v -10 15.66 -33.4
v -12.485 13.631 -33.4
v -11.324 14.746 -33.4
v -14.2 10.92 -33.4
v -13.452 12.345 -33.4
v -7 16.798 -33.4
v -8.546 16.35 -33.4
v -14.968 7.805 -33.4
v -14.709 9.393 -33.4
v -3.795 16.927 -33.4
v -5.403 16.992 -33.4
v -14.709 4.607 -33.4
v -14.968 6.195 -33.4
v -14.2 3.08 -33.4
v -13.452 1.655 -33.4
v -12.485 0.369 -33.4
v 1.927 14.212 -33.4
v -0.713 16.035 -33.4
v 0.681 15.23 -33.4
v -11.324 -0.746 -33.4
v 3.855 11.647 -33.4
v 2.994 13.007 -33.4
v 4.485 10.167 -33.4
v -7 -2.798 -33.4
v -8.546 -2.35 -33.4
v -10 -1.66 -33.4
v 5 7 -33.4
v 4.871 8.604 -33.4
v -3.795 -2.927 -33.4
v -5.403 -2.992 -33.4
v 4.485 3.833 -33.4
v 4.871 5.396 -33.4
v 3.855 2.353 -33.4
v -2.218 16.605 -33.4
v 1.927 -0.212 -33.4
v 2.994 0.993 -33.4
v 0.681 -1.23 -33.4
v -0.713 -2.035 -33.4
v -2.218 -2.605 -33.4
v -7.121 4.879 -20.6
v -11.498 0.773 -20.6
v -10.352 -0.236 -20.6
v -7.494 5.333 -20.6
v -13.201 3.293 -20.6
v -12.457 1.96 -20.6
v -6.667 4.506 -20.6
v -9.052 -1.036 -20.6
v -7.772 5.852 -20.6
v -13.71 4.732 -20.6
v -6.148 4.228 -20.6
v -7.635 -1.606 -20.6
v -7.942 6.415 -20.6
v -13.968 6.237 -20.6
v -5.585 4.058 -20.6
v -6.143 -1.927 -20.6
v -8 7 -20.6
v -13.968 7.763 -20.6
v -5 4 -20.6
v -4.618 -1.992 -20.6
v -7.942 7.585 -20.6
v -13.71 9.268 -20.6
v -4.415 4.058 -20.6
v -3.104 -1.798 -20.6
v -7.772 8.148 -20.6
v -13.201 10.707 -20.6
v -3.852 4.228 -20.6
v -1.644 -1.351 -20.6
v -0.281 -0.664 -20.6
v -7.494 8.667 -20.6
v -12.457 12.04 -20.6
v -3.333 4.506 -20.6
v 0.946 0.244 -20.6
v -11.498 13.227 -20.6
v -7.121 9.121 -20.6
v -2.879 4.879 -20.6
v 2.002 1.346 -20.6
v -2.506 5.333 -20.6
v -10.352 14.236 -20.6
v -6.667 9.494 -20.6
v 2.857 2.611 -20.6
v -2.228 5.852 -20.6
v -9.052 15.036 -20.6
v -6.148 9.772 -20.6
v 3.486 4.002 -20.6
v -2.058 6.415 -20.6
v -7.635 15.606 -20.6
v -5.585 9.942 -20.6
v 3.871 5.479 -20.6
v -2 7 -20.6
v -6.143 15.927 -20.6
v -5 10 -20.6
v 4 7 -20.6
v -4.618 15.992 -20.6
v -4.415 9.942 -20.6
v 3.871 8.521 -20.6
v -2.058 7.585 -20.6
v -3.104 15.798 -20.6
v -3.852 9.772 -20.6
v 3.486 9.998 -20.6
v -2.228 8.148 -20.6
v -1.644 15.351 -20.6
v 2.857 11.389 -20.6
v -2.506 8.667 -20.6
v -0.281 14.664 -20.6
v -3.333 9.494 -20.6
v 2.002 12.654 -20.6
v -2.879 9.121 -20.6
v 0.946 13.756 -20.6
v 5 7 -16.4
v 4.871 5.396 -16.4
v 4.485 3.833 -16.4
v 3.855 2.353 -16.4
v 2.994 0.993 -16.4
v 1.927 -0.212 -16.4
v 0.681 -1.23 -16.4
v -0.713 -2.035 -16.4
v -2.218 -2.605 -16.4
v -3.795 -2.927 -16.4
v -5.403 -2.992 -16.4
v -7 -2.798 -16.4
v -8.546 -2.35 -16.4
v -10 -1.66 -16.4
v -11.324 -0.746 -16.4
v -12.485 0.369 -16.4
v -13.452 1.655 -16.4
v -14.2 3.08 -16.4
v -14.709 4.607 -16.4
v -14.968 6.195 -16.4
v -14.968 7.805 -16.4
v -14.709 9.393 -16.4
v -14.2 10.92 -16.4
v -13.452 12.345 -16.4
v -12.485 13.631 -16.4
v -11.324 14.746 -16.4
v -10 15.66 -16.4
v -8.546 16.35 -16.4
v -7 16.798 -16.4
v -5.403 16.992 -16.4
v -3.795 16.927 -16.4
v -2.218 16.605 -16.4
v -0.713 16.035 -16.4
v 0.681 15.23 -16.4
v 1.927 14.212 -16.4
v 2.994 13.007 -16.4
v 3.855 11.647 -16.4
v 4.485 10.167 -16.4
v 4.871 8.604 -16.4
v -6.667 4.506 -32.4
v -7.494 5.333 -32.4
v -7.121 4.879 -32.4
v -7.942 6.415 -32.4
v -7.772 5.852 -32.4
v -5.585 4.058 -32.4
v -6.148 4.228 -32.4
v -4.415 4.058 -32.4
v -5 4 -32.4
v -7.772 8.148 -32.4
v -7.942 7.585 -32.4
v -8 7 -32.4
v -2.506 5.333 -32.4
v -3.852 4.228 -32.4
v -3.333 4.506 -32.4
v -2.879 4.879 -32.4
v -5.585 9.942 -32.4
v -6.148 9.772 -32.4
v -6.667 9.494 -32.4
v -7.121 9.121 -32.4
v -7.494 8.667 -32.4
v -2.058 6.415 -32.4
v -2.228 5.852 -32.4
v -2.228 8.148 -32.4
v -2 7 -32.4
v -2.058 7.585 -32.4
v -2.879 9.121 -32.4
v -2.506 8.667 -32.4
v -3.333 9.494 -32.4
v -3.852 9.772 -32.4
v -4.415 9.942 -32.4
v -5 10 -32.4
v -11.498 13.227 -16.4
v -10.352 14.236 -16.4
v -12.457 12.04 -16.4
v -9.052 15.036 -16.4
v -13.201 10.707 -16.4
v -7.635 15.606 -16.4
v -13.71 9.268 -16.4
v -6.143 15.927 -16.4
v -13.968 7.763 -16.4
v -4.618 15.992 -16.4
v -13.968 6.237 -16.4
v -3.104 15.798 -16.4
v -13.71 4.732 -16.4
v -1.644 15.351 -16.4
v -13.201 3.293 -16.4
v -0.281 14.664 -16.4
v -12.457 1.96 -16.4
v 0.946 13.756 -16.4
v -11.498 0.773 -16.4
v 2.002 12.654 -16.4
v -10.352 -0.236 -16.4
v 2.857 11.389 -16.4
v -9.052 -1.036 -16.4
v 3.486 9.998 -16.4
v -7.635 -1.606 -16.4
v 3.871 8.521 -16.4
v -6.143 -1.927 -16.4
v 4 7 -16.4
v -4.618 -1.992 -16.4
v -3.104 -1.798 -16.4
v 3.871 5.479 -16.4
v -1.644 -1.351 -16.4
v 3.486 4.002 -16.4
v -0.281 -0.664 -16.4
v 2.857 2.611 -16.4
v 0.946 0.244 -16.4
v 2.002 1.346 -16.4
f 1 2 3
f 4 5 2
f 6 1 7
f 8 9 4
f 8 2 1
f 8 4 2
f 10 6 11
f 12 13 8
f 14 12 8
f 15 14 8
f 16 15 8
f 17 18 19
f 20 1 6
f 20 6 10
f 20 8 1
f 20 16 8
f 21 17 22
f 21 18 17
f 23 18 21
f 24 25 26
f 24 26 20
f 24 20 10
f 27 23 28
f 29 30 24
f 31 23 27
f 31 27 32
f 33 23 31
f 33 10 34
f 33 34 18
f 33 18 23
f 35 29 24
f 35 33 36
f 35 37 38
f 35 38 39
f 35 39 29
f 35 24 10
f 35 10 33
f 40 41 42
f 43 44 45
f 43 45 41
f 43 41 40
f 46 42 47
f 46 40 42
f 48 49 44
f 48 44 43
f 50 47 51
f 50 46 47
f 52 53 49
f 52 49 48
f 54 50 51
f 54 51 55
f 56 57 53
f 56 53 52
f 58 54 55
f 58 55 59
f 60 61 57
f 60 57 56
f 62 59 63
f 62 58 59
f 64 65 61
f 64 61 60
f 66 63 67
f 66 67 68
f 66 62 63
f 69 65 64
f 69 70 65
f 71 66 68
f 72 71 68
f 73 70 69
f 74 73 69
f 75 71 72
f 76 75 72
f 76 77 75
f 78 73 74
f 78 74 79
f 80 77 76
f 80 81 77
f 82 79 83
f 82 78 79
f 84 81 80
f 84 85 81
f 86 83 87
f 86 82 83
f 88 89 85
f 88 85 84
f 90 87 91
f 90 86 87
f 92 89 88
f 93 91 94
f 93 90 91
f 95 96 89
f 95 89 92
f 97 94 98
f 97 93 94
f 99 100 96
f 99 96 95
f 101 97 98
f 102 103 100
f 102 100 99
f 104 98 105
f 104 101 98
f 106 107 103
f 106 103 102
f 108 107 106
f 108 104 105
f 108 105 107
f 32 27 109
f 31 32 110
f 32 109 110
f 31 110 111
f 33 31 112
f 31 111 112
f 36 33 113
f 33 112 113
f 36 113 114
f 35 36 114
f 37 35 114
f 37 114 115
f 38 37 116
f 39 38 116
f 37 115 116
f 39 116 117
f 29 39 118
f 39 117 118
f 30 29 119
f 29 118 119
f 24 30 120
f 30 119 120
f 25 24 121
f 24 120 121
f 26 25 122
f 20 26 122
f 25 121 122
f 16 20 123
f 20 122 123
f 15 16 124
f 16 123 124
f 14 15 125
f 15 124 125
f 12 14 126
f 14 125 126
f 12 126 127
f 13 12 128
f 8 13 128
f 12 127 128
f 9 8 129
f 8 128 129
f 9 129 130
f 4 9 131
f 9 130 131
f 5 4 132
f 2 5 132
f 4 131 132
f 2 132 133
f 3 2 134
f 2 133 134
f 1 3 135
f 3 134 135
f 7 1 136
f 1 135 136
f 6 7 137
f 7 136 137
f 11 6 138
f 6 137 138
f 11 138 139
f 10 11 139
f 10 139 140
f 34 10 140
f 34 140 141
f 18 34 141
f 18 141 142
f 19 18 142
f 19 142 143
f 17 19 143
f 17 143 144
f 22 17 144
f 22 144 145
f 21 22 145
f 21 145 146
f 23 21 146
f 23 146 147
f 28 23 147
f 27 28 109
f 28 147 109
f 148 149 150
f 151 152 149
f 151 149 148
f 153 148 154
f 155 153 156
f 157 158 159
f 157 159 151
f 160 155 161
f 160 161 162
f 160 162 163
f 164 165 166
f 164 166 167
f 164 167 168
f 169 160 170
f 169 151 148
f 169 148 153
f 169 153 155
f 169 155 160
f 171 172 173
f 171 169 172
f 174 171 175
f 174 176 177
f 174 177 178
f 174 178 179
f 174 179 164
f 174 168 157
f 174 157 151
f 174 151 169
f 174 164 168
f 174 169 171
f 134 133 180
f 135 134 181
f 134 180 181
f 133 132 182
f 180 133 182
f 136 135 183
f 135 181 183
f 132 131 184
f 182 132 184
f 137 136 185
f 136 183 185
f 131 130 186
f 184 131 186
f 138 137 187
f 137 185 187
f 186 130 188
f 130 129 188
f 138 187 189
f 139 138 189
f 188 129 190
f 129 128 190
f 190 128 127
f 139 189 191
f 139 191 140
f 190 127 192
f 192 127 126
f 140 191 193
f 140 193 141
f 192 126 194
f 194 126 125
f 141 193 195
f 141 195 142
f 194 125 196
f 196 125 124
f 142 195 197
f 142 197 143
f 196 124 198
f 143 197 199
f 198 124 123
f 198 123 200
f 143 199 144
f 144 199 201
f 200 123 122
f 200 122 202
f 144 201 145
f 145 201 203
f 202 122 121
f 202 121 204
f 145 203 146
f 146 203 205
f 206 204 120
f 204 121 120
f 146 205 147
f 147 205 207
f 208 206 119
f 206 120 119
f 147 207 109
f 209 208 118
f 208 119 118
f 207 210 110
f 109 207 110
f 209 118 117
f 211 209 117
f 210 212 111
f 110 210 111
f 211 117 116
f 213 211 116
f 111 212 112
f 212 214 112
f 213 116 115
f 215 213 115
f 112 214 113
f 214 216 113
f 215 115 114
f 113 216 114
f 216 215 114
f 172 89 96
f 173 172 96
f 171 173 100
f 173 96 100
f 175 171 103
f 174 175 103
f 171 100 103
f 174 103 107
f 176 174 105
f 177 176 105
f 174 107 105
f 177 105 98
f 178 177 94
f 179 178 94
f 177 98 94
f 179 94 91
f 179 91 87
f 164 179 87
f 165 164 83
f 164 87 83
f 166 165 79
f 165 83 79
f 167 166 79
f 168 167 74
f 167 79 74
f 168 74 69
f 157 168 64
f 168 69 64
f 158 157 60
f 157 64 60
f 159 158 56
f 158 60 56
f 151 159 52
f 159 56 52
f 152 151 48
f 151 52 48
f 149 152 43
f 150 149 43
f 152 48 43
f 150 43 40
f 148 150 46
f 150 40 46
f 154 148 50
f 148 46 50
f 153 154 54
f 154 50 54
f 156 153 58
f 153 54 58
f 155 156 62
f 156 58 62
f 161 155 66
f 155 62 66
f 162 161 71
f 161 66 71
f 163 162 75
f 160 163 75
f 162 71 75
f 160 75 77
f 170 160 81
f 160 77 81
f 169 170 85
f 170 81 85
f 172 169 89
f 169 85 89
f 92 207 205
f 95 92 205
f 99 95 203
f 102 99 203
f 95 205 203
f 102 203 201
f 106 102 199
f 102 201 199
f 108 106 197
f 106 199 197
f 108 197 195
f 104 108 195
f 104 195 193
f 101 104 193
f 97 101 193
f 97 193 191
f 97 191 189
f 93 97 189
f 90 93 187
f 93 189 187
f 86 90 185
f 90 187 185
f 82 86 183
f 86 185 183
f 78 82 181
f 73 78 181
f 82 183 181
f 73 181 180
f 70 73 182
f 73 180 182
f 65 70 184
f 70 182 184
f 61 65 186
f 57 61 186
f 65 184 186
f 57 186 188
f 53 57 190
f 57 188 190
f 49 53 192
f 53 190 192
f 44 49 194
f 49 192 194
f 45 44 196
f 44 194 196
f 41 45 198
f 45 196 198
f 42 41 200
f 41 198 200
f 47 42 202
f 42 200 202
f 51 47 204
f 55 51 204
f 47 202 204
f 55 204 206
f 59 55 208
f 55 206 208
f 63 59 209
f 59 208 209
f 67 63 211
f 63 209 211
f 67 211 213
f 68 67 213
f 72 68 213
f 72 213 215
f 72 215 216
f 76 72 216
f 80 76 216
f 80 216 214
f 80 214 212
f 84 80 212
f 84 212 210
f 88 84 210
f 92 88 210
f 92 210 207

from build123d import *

# Parameters (mm, degrees)
SKETCH019_R             = 10
PAD019_DEPTH            = 17
SKETCH020_R             = 9
POCKET_DEPTH            = 4.2
SKETCH021_R             = 3
POCKET001_DEPTH         = 11.8
BODY009_PLACEMENT_ANGLE = 180


with BuildPart() as part:
    # Sketch019 → Pad019 (new body)
    with BuildSketch(Plane.XY):
        Circle(SKETCH019_R)
    extrude(amount=PAD019_DEPTH)

    # Sketch020 (on Face2 of Pad019) → Pocket (cut)
    with BuildSketch(Plane(origin=(0, 0, 0), x_dir=(1, 0, 0), z_dir=(0, 0, -1))):
        Circle(SKETCH020_R)
    extrude(amount=-POCKET_DEPTH, mode=Mode.SUBTRACT)

    # Sketch021 (on Face5 of Pocket) → Pocket001 (cut)
    with BuildSketch(Plane(origin=(0, 0, 4.2), x_dir=(1, 0, 0), z_dir=(0, 0, -1))):
        Circle(SKETCH021_R)
    extrude(amount=-POCKET001_DEPTH, mode=Mode.SUBTRACT)


with BuildPart() as part_1:
    # Body009 placement: moved
    add(part.part.moved(Location((-5, 7, -16.4))).rotate(Axis((-5, 7, -16.4), (1, 0, 0)), BODY009_PLACEMENT_ANGLE))


solid = part_1.part
